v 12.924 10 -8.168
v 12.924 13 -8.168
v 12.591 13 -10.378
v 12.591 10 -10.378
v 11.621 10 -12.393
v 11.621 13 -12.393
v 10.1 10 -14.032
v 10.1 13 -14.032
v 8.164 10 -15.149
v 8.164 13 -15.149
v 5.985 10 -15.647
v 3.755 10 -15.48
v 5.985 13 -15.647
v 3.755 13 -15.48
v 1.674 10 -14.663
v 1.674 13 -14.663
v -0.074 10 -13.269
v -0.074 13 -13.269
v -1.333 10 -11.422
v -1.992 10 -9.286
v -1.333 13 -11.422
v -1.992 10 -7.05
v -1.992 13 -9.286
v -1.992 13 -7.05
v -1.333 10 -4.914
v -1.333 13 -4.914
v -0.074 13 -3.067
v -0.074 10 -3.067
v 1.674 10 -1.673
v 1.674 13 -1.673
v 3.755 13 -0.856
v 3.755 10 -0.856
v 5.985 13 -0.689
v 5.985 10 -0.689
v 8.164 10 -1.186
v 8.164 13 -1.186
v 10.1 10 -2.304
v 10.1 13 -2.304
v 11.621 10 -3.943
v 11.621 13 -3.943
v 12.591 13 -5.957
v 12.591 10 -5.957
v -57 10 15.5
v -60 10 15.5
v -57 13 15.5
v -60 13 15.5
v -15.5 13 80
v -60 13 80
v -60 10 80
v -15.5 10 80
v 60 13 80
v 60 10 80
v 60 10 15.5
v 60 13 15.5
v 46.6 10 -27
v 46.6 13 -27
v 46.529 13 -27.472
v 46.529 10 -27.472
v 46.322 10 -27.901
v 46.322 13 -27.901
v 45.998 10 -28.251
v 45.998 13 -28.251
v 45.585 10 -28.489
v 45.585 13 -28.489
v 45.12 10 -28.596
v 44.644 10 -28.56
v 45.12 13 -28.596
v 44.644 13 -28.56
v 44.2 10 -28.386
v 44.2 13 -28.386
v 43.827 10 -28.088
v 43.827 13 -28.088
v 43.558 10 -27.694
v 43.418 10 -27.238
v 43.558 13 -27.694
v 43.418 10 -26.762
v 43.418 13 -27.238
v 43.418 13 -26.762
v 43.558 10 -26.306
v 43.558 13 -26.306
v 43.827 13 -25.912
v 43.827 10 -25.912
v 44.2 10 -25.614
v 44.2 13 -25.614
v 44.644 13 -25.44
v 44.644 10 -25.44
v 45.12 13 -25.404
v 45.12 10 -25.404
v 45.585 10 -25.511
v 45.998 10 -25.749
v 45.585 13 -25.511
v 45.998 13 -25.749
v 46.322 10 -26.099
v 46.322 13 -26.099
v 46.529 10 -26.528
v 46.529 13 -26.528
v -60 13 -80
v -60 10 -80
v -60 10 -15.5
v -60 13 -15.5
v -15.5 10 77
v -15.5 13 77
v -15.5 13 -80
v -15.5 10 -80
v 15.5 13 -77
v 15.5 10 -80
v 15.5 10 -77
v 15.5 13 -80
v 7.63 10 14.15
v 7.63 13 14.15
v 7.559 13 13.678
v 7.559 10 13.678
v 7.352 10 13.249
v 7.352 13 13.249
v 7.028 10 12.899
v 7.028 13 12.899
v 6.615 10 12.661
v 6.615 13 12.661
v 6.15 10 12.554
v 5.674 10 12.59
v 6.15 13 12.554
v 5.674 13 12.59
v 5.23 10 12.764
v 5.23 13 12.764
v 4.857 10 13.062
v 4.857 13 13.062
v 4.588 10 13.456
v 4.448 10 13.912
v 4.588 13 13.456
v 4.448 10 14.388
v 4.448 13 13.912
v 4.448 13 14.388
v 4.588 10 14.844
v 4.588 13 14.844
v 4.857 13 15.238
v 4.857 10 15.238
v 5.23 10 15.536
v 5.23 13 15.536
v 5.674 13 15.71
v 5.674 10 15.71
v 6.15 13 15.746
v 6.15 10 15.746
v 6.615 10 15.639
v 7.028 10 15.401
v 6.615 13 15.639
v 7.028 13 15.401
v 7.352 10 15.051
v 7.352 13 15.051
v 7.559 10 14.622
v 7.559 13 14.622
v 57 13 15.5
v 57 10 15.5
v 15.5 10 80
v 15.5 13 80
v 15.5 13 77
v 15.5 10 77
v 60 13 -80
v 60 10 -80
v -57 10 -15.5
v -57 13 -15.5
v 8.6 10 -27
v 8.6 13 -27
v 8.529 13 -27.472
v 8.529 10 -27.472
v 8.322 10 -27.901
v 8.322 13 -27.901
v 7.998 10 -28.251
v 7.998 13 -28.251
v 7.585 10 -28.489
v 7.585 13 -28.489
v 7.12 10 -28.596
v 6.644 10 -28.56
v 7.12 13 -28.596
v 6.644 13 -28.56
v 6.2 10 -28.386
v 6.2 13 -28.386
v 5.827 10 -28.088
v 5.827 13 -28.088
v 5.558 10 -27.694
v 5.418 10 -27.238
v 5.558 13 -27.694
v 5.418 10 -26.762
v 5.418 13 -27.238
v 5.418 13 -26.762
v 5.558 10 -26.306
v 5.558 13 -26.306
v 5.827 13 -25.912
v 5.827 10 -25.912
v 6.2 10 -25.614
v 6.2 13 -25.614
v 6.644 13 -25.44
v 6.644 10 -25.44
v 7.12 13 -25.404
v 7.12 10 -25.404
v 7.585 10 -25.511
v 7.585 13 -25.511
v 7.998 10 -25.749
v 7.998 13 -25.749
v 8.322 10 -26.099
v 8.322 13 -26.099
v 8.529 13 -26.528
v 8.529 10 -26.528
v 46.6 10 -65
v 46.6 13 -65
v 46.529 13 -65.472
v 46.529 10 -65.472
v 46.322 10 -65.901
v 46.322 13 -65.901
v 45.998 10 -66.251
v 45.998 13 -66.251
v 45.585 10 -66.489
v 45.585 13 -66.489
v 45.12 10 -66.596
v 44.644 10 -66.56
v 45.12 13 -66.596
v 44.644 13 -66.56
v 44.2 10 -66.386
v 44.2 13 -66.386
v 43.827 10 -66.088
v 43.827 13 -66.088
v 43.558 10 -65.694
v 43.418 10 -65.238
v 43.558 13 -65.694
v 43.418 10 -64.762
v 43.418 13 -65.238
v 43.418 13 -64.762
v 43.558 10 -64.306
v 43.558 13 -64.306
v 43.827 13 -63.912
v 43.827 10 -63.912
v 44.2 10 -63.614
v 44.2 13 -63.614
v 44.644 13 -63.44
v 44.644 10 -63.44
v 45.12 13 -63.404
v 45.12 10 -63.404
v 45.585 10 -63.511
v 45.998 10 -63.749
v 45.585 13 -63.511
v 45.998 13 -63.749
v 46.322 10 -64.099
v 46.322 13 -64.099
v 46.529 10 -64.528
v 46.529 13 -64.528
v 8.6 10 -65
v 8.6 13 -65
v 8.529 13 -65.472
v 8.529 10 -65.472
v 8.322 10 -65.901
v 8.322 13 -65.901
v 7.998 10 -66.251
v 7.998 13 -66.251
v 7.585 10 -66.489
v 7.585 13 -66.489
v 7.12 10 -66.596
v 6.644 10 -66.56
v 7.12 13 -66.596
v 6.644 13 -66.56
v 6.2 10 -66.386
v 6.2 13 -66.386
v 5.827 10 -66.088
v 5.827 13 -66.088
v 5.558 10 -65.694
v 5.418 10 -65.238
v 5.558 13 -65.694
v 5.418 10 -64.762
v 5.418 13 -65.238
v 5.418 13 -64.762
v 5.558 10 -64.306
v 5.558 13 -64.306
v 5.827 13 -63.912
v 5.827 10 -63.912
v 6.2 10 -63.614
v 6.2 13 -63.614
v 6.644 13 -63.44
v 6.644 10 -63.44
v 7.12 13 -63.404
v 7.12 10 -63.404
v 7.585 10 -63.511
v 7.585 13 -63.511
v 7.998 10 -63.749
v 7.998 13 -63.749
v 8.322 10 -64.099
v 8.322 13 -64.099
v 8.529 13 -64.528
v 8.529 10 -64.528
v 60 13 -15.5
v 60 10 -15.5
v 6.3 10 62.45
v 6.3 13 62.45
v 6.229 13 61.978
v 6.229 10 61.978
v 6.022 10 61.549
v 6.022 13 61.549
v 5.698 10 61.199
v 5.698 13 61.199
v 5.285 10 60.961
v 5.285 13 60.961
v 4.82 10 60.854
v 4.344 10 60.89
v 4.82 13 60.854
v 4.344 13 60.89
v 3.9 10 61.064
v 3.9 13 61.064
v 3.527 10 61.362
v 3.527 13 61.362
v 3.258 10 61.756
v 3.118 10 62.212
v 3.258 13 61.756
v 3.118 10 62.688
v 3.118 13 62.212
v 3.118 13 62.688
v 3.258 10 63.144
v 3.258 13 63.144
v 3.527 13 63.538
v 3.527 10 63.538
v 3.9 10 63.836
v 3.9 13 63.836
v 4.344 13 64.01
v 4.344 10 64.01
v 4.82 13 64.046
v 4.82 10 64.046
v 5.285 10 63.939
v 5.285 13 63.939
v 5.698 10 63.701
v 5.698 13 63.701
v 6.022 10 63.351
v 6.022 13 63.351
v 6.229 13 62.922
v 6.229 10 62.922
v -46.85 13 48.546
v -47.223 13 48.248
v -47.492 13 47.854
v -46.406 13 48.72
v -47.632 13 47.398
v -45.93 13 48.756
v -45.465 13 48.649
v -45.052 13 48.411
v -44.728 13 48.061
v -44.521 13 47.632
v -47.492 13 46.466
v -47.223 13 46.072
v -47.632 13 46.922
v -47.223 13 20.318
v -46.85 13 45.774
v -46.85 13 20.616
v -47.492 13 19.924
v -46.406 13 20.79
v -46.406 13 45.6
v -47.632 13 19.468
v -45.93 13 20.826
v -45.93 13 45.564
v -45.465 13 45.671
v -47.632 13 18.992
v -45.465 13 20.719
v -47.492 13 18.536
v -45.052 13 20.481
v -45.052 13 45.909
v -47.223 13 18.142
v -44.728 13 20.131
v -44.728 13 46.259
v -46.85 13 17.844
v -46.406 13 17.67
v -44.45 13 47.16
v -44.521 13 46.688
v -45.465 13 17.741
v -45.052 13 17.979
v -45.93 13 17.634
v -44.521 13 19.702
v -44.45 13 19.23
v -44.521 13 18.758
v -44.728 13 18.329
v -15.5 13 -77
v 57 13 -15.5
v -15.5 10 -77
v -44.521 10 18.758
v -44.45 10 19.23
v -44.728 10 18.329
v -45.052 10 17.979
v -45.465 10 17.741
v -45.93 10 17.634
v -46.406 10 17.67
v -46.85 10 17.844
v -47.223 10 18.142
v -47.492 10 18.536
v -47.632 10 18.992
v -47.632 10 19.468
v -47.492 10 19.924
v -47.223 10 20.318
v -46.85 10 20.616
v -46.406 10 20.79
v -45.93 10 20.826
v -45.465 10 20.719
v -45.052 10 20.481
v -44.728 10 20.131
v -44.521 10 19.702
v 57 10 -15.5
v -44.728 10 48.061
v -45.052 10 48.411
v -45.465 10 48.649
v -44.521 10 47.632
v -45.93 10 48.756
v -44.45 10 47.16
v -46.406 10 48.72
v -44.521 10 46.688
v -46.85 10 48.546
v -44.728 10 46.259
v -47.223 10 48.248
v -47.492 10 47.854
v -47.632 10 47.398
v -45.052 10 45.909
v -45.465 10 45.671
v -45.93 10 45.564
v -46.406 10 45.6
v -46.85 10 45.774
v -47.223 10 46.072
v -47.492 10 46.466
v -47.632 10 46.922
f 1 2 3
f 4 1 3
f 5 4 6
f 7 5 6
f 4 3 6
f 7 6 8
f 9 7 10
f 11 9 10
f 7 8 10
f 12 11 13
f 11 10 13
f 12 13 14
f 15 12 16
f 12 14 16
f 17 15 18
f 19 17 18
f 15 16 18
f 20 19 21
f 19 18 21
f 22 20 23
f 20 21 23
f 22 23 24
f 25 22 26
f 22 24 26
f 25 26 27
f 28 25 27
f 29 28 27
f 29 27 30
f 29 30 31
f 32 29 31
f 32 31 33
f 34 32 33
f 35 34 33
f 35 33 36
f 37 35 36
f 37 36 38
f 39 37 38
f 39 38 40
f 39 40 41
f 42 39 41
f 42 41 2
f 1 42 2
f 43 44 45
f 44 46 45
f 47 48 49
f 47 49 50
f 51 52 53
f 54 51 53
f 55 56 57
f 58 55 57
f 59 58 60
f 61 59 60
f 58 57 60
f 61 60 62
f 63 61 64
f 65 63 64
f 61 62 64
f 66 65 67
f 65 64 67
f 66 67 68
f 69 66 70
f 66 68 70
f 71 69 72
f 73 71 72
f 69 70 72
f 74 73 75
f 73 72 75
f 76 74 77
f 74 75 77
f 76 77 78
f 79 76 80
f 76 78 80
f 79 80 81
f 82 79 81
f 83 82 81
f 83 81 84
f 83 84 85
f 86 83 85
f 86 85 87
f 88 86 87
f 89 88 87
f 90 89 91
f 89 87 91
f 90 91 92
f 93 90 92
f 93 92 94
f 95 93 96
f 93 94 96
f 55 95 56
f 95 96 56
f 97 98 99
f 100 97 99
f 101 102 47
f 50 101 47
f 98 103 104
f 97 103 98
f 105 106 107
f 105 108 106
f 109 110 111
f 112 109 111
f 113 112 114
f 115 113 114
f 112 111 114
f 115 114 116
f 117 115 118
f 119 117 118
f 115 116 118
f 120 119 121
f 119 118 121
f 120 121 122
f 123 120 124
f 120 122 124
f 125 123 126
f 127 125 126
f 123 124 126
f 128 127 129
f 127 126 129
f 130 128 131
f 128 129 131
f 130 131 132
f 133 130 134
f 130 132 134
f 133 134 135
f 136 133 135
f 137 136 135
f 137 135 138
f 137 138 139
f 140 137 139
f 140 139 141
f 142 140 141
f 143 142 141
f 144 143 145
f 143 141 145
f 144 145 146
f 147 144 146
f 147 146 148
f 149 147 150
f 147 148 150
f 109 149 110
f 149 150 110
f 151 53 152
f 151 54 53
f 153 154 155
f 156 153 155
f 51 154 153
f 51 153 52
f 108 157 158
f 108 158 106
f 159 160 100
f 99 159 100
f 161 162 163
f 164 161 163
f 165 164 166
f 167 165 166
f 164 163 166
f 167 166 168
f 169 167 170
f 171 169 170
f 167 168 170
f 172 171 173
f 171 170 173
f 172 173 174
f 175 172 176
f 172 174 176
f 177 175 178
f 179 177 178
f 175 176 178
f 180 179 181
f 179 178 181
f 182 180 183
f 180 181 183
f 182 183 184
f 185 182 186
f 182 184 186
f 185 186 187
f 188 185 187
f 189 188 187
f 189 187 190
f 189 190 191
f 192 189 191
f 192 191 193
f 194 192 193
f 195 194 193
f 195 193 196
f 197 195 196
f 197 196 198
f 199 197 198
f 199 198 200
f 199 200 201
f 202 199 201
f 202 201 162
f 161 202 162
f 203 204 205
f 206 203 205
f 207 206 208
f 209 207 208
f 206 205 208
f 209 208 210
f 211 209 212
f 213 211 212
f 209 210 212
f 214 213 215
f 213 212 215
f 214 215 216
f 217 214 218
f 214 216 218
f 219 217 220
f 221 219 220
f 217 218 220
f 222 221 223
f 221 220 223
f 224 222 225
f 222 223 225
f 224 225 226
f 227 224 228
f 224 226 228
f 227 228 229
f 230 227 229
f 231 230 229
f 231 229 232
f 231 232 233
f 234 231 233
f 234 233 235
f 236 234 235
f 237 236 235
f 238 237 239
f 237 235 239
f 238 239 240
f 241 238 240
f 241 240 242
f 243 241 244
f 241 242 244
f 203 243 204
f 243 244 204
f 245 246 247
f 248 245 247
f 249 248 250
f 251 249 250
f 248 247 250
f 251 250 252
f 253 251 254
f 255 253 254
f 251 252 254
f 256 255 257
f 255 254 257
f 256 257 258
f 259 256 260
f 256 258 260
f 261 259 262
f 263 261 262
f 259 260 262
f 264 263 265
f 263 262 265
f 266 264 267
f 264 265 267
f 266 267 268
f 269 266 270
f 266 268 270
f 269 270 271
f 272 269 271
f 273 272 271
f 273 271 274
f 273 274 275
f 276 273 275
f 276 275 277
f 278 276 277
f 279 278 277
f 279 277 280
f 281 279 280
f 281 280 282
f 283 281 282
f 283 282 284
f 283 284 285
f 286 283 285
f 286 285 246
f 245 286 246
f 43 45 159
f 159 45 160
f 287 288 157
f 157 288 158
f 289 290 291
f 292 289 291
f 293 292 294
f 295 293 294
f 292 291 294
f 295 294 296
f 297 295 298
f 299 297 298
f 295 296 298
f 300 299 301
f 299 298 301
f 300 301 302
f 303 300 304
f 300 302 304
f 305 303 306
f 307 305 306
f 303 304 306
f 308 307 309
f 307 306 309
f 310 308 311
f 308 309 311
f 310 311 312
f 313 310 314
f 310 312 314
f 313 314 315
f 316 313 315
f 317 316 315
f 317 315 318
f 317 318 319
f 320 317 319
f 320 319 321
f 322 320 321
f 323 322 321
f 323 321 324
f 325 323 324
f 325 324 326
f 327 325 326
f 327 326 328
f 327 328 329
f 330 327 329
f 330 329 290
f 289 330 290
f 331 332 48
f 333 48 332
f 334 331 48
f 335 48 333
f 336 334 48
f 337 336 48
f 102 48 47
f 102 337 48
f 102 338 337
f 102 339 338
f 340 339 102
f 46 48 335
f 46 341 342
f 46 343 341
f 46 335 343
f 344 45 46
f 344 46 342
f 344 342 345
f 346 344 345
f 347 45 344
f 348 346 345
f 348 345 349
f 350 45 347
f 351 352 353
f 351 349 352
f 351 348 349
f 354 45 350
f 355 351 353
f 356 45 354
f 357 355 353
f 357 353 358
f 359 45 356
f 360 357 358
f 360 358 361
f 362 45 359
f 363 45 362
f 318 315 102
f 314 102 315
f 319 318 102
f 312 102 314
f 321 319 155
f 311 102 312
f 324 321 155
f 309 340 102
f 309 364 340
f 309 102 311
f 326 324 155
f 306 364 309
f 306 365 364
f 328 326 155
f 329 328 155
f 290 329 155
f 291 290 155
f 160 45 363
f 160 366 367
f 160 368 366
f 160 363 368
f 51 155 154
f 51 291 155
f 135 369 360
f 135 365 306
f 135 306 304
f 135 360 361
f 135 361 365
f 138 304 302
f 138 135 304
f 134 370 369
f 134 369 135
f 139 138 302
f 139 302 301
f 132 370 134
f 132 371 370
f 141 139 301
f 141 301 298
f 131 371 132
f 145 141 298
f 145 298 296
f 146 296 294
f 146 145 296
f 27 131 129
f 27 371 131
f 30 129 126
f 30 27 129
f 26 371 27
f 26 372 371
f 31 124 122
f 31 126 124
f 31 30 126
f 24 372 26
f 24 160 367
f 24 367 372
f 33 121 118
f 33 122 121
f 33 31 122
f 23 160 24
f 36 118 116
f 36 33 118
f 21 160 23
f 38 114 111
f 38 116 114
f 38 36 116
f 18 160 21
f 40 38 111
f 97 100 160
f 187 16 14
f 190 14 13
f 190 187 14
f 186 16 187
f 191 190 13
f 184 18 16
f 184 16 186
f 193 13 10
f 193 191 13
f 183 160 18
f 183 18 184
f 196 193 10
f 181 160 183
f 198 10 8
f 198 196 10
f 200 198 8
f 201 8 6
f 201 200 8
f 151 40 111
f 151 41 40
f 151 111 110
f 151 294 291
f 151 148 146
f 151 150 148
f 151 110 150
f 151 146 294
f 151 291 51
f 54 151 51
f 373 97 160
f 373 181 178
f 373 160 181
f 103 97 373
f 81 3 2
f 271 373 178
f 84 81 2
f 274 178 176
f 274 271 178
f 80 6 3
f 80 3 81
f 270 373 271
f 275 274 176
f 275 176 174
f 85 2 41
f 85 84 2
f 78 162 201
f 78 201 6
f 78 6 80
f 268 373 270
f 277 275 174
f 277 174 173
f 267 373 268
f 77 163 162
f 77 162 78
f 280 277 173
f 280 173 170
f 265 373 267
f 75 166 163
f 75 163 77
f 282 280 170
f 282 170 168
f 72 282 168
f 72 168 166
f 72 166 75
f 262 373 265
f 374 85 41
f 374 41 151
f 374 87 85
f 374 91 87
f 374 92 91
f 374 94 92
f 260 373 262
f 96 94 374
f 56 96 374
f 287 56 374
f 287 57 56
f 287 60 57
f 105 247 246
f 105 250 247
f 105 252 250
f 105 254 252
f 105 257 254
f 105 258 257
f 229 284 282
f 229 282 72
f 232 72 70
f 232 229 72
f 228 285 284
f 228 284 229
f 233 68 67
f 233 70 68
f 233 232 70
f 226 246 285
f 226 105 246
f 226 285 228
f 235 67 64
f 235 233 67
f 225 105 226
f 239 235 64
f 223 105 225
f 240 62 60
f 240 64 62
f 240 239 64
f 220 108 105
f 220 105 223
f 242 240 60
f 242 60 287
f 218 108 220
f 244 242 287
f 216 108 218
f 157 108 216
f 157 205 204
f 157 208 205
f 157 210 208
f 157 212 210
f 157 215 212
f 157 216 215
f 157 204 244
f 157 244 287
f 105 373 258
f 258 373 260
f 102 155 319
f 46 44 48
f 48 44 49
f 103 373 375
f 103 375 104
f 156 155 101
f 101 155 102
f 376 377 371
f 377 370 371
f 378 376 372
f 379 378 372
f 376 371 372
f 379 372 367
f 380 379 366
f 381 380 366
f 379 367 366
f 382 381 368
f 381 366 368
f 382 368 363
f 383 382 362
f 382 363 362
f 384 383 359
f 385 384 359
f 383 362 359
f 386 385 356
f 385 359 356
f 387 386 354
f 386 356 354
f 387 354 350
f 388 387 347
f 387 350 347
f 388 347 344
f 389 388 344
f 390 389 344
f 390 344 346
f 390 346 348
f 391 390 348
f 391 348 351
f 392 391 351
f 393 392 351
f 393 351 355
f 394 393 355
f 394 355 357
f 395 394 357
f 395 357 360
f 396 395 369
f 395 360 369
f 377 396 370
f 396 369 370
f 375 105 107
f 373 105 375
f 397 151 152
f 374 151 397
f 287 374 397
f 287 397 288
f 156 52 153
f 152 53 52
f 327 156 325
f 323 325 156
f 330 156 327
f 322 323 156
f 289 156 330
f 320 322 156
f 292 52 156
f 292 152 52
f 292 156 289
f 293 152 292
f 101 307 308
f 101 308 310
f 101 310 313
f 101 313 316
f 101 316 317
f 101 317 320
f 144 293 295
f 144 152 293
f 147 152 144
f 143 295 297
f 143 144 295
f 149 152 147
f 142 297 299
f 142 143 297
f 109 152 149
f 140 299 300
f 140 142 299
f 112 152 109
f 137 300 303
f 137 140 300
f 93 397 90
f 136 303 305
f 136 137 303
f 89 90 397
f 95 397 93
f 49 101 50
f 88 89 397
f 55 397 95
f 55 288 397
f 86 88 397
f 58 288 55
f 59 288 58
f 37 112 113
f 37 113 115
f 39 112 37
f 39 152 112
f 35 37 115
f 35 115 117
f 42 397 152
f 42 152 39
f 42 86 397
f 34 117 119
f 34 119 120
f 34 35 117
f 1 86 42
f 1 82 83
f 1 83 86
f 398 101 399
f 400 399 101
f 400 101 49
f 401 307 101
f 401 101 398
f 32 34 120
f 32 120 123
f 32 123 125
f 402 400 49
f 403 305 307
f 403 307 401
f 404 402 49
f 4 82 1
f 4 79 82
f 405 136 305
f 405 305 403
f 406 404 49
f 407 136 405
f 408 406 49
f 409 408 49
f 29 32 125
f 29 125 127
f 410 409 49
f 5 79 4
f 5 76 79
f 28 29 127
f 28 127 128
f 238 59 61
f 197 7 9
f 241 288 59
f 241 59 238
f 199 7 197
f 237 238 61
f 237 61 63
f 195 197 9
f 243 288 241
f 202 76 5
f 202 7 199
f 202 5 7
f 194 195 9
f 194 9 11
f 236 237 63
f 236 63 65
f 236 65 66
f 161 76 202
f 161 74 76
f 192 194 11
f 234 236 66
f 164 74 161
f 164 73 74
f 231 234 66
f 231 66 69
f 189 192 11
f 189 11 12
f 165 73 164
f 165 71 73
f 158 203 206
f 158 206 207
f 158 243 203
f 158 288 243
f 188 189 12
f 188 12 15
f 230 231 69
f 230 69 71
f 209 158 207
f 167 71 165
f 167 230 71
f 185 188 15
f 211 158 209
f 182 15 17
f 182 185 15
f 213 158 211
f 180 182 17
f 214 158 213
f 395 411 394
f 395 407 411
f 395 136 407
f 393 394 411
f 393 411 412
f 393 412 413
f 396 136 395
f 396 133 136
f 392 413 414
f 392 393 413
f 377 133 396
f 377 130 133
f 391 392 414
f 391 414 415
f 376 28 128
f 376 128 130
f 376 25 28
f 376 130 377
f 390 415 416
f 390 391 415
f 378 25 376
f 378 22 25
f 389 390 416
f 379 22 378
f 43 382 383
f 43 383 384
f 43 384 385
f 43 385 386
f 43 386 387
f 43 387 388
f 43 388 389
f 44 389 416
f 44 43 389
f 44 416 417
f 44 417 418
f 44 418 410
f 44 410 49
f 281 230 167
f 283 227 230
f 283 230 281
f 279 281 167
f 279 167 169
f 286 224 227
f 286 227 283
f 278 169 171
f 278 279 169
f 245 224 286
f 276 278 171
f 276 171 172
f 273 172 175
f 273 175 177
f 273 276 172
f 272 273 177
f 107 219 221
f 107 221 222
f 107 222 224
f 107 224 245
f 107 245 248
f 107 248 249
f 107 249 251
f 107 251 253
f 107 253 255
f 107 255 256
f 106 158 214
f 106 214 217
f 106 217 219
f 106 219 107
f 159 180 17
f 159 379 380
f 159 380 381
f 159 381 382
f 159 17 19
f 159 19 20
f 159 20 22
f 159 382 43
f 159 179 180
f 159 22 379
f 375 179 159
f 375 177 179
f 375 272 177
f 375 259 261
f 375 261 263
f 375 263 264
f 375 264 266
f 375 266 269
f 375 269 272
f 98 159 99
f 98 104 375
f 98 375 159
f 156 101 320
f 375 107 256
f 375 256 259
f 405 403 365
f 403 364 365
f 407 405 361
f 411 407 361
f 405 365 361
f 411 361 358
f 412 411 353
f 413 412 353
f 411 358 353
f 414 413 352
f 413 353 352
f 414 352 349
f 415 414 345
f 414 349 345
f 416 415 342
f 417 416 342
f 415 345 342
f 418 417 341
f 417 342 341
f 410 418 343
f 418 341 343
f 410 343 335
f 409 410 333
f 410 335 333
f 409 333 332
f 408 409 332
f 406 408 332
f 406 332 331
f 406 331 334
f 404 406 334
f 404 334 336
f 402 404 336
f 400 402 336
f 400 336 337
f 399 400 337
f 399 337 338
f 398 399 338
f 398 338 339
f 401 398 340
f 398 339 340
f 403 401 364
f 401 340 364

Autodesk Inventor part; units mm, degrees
ref_plane "YZ Plane" through (0, 0, 0) normal (1, 0, 0) x (0, 1, 0)
ref_plane "XZ Plane" through (0, 0, 0) normal (0, 1, 0) x (-1, 0, 0)
ref_plane "XY Plane" through (0, 0, 0) normal (0, 0, 1) x (1, 0, 0)
sketch "스케치1" plane through (0, 0, 0) normal (0, 1, 0) x (-1, 0, 0)
  line L0 (60, 80) -> (-60, 80)
  line L1 (-60, 80) -> (-60, -80)
  line L2 (-60, -80) -> (60, -80)
  line L3 (60, -80) -> (60, 80)
  line L4 (60, 80) -> (-60, -80) construction
  line L5 (-60, 80) -> (60, -80) construction
  point P0 (0, 0)
  dimension "d0" = 120
  dimension "d1" = 160
extrude "돌출1" add sketch "스케치1" along normal blind 60
sketch "스케치2" plane through (0, 60, 0) normal (0, 1, 0) x (1, 0, 0)
  line L0 (60, -80) -> (60, 80) projected
  line L1 (60, 80) -> (-60, 80) projected
  line L2 (55, 102.1646) -> (-55, 102.1646)
  line L3 (-55, 102.1646) -> (-55, -89.711)
  line L4 (-55, -89.711) -> (55, -89.711)
  line L5 (55, -89.711) -> (55, 102.1646)
  line L6 (-60, 80) -> (-60, -80) projected
  point P0 (0, 0)
  point P1 (55, 80)
  point P2 (-55, 80)
  dimension "d6" = 5
  dimension "d7" = 5
extrude "돌출2" cut sketch "스케치2" against normal blind 40 contours L5 L4 L3 L1
sketch "스케치12" plane through (60, 0, -80) normal (0, 0, -1) x (-1, 0, 0)
  line L0 (-34.8463, 10) -> (156.2634, 10)
  line L1 (156.2634, 10) -> (156.2634, -36.9465)
  line L2 (156.2634, -36.9465) -> (-34.8463, -36.9465)
  line L3 (-34.8463, -36.9465) -> (-34.8463, 10)
  line L4 (0, 0) -> (120, 0) projected
  point P0 (60, 0)
  dimension "d85" = 10
extrude "돌출10" cut sketch "스케치12" against normal through all
sketch "스케치13" plane through (-55, 20, 80) normal (0, 0, 1) x (1, 0, 0)
  line L0 (0, 40) -> (0, 0) projected
  line L1 (0, 0) -> (110, 0) projected
  line L2 (0, 40) -> (110, 40)
  line L3 (110, 40) -> (110, 0)
  line L4 (110, 0) -> (0, 0)
  line L5 (0, 0) -> (0, 40)
  point P0 (55, -20)
extrude "돌출11" add sketch "스케치13" against normal blind 5
sketch "스케치14" plane through (55, 20, -80) normal (0, 0, -1) x (-1, 0, 0)
  line L0 (0, 0) -> (0, 40) projected
  line L1 (110, 0) -> (0, 0) projected
  line L2 (0, 40) -> (110, 40)
  line L3 (110, 40) -> (110, 0)
  line L4 (110, 0) -> (0, 0)
  line L5 (0, 0) -> (0, 40)
  point P0 (55, -20)
extrude "돌출12" add sketch "스케치14" against normal blind 5
sketch "스케치15" plane through (60, 60, -80) normal (0, 0, -1) x (-1, 0, 0)
  point P0 (60, -60)
sketch "스케치16" plane through (60, 60, -80) normal (0, 0, -1) x (-1, 0, 0)
  point P0 (60, -60)
sketch "스케치17" plane through (0, 20, 0) normal (0, 1, 0) x (1, 0, 0)
  line L0 (7, 27) -> (45, 27)
  line L1 (45, 27) -> (45, 65)
  line L2 (45, 65) -> (7, 65)
  line L3 (7, 65) -> (7, 27)
  line L4 (55, 75) -> (55, -75) projected
  line L5 (55, 75) -> (-55, 75) projected
  circle A0 centre (7, 27) radius 1.6
  circle A1 centre (7, 65) radius 1.6
  circle A2 centre (45, 65) radius 1.6
  circle A3 centre (45, 27) radius 1.6
  line L6 (-47.9371, 14.7215) -> (-7.9371, 14.7215)
  line L7 (-7.9371, 14.7215) -> (-7.9371, 64.7215)
  line L8 (-7.9371, 64.7215) -> (-47.9371, 64.7215)
  line L9 (-47.9371, 64.7215) -> (-47.9371, 14.7215)
  point P0 (0, 0)
  dimension "d92" = 38
  dimension "d93" = 38
  dimension "d95" = 10
  dimension "d96" = 10
  dimension "d97" = 3.2
  dimension "d98" = 3.2
  dimension "d99" = 3.2
  dimension "d100" = 3.2
  dimension "d113" = 40
  dimension "d114" = 50
extrude "돌출13" cut sketch "스케치17" against normal through all contours L3 A0 L0 | L0 A0 L3 | A3 L1 L0 | L0 L1 A3 | A1 L2 L3 | L3 L2 A1 | A2 L2 L1 | L1 L2 A2
sketch "스케치21" plane through (0, 20, 0) normal (0, 1, 0) x (1, 0, 0)
  circle A0 centre (5.4243, 8.1678) radius 7.5
  line L0 (-49.3888, 17.2731) -> (-9.3888, 17.2731)
  line L1 (-9.3888, 17.2731) -> (-9.3888, 67.2731)
  line L2 (-9.3888, 67.2731) -> (-49.3888, 67.2731)
  line L3 (-49.3888, 67.2731) -> (-49.3888, 17.2731)
  point P0 (0, 0)
  dimension "d117" = 15
  dimension "d118" = 50
  dimension "d119" = 40
extrude "돌출15" cut sketch "스케치21" against normal through all contours A0
sketch "스케치23" plane through (0, 20, 0) normal (0, 1, 0) x (1, 0, 0)
  line L0 (-48.6, -65) -> (20, -65)
  line L1 (20, -65) -> (20, -11.6)
  line L2 (20, -11.6) -> (-48.6, -11.6)
  line L3 (-48.6, -11.6) -> (-48.6, -65)
  line L4 (55, 75) -> (55, -75) projected
  line L5 (-55, -75) -> (55, -75) projected
  circle A0 centre (4.7, -62.45) radius 1.6
  circle A1 centre (6.03, -14.15) radius 1.6
  circle A2 centre (-46.05, -47.16) radius 1.6
  circle A3 centre (-46.05, -19.23) radius 1.6
  point P0 (0, 0)
  dimension "d123" = 68.6
  dimension "d124" = 53.4
  dimension "d125" = 35
  dimension "d126" = 10
  dimension "d127" = 3.2
  dimension "d128" = 15.3
  dimension "d129" = 2.55
  dimension "d130" = 3.2
  dimension "d131" = 13.97
  dimension "d132" = 2.55
  dimension "d133" = 3.2
  dimension "d134" = 35.56
  dimension "d135" = 3.2
  dimension "d136" = 2.55
  dimension "d137" = 2.55
  dimension "d138" = 7.63
extrude "돌출16" cut sketch "스케치23" against normal through all contours A0 | A1 | A2 | A3
sketch "스케치24" plane through (0, 60, 0) normal (0, 1, 0) x (1, 0, 0)
  line L0 (-60, 80) -> (-60, -80) projected
  line L1 (60, 80) -> (-60, 80) projected
  line L2 (-60, -80) -> (60, -80)
  line L3 (60, -80) -> (60, 80)
  line L4 (60, 80) -> (-60, 80)
  line L5 (-60, 80) -> (-60, -80)
  point P0 (0, 0)
extrude "돌출17" cut sketch "스케치24" against normal blind 40
sketch "스케치25" plane through (60, 20, -80) normal (0, 0, -1) x (-1, 0, 0)
  point P0 (60, -20)
sketch "스케치26" plane through (0, 20, 0) normal (0, 1, 0) x (1, 0, 0)
  point P0 (0, 0)
sketch "스케치27" plane through (0, 20, 0) normal (0, 1, 0) x (1, 0, 0)
  line L0 (-60, -80) -> (-60, 80) projected
  line L1 (60, 80) -> (60, -80) projected
  line L2 (-60, -80) -> (60, -80)
  line L3 (60, -80) -> (60, 80)
  line L4 (60, 80) -> (-60, 80)
  line L5 (-60, 80) -> (-60, -80)
  point P0 (0, 0)
  point P1 (60, -80)
extrude "돌출18" cut sketch "스케치27" against normal blind 7
sketch "스케치28" plane through (0, 13, 0) normal (0, 1, 0) x (1, 0, 0)
  line L0 (-68.1907, -15.5) -> (-57, -15.5)
  line L1 (-57, -15.5) -> (-57, 15.5)
  line L2 (-57, 15.5) -> (-68.1907, 15.5)
  line L3 (-68.1907, 15.5) -> (-68.1907, -15.5)
  line L4 (-60, -80) -> (-60, 80) projected
  line L5 (60, -80) -> (-60, -80) projected
  line L6 (-15.5, -89.4714) -> (15.5, -89.4714)
  line L7 (15.5, -89.4714) -> (15.5, -77)
  line L8 (15.5, -77) -> (-15.5, -77)
  line L9 (-15.5, -77) -> (-15.5, -89.4714)
  line L10 (-60, 0) -> (60, 0)
  line L11 (0, 80) -> (0, -80)
  line L12 (-60, -80) -> (60, -80) projected
  line L13 (-15.5, 89.4714) -> (15.5, 89.4714)
  line L14 (15.5, 89.4714) -> (15.5, 77)
  line L15 (15.5, 77) -> (-15.5, 77)
  line L16 (-15.5, 77) -> (-15.5, 89.4714)
  line L17 (68.1907, -15.5) -> (57, -15.5)
  line L18 (57, -15.5) -> (57, 15.5)
  line L19 (57, 15.5) -> (68.1907, 15.5)
  line L20 (68.1907, 15.5) -> (68.1907, -15.5)
  point P0 (0, 0)
  dimension "d145" = 3
  dimension "d146" = 64.5
  dimension "d147" = 31
  dimension "d148" = 31
  dimension "d149" = 44.5
  dimension "d152" = 3
extrude "돌출19" cut sketch "스케치28" against normal through all contours L3 L2 L4 L0 | L15 L16 L13 L14 | L18 L19 L20 L17 | L4 L10 L1 L0 | L4 L2 L1 L10 | L9 L8 L11 L5 | L5 L7 L6 L9 | L11 L8 L7 L5
properties part number "본체 뚜껑 레이저"
